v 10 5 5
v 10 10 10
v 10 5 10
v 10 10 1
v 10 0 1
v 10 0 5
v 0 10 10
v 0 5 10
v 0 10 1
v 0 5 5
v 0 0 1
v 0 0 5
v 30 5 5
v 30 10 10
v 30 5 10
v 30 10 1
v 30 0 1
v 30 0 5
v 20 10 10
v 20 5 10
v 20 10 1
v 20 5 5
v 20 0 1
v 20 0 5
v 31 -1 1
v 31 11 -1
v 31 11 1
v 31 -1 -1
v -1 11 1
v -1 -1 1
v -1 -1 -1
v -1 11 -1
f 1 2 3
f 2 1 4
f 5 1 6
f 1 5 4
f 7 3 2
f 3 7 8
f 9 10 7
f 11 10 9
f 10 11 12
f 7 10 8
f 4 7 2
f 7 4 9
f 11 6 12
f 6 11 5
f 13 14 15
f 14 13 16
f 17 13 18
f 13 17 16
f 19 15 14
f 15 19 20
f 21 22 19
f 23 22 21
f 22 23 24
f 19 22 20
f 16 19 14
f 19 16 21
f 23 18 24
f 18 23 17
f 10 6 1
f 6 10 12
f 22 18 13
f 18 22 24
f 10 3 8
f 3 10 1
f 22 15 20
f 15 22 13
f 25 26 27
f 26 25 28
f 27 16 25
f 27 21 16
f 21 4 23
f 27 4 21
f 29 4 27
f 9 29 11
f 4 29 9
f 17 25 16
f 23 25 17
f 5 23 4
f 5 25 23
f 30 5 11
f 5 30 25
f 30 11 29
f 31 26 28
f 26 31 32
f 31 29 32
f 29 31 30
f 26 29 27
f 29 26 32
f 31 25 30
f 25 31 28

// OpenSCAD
render() difference() {
  union() {
    color("red") cube(10);
    color("green") translate([20,0,0]) cube(10);
  }
  color("blue") translate([-1,-5,5]) cube([32,10,10]);
}
color("purple") translate([-1,-1,-1]) cube([32,12,2]);
